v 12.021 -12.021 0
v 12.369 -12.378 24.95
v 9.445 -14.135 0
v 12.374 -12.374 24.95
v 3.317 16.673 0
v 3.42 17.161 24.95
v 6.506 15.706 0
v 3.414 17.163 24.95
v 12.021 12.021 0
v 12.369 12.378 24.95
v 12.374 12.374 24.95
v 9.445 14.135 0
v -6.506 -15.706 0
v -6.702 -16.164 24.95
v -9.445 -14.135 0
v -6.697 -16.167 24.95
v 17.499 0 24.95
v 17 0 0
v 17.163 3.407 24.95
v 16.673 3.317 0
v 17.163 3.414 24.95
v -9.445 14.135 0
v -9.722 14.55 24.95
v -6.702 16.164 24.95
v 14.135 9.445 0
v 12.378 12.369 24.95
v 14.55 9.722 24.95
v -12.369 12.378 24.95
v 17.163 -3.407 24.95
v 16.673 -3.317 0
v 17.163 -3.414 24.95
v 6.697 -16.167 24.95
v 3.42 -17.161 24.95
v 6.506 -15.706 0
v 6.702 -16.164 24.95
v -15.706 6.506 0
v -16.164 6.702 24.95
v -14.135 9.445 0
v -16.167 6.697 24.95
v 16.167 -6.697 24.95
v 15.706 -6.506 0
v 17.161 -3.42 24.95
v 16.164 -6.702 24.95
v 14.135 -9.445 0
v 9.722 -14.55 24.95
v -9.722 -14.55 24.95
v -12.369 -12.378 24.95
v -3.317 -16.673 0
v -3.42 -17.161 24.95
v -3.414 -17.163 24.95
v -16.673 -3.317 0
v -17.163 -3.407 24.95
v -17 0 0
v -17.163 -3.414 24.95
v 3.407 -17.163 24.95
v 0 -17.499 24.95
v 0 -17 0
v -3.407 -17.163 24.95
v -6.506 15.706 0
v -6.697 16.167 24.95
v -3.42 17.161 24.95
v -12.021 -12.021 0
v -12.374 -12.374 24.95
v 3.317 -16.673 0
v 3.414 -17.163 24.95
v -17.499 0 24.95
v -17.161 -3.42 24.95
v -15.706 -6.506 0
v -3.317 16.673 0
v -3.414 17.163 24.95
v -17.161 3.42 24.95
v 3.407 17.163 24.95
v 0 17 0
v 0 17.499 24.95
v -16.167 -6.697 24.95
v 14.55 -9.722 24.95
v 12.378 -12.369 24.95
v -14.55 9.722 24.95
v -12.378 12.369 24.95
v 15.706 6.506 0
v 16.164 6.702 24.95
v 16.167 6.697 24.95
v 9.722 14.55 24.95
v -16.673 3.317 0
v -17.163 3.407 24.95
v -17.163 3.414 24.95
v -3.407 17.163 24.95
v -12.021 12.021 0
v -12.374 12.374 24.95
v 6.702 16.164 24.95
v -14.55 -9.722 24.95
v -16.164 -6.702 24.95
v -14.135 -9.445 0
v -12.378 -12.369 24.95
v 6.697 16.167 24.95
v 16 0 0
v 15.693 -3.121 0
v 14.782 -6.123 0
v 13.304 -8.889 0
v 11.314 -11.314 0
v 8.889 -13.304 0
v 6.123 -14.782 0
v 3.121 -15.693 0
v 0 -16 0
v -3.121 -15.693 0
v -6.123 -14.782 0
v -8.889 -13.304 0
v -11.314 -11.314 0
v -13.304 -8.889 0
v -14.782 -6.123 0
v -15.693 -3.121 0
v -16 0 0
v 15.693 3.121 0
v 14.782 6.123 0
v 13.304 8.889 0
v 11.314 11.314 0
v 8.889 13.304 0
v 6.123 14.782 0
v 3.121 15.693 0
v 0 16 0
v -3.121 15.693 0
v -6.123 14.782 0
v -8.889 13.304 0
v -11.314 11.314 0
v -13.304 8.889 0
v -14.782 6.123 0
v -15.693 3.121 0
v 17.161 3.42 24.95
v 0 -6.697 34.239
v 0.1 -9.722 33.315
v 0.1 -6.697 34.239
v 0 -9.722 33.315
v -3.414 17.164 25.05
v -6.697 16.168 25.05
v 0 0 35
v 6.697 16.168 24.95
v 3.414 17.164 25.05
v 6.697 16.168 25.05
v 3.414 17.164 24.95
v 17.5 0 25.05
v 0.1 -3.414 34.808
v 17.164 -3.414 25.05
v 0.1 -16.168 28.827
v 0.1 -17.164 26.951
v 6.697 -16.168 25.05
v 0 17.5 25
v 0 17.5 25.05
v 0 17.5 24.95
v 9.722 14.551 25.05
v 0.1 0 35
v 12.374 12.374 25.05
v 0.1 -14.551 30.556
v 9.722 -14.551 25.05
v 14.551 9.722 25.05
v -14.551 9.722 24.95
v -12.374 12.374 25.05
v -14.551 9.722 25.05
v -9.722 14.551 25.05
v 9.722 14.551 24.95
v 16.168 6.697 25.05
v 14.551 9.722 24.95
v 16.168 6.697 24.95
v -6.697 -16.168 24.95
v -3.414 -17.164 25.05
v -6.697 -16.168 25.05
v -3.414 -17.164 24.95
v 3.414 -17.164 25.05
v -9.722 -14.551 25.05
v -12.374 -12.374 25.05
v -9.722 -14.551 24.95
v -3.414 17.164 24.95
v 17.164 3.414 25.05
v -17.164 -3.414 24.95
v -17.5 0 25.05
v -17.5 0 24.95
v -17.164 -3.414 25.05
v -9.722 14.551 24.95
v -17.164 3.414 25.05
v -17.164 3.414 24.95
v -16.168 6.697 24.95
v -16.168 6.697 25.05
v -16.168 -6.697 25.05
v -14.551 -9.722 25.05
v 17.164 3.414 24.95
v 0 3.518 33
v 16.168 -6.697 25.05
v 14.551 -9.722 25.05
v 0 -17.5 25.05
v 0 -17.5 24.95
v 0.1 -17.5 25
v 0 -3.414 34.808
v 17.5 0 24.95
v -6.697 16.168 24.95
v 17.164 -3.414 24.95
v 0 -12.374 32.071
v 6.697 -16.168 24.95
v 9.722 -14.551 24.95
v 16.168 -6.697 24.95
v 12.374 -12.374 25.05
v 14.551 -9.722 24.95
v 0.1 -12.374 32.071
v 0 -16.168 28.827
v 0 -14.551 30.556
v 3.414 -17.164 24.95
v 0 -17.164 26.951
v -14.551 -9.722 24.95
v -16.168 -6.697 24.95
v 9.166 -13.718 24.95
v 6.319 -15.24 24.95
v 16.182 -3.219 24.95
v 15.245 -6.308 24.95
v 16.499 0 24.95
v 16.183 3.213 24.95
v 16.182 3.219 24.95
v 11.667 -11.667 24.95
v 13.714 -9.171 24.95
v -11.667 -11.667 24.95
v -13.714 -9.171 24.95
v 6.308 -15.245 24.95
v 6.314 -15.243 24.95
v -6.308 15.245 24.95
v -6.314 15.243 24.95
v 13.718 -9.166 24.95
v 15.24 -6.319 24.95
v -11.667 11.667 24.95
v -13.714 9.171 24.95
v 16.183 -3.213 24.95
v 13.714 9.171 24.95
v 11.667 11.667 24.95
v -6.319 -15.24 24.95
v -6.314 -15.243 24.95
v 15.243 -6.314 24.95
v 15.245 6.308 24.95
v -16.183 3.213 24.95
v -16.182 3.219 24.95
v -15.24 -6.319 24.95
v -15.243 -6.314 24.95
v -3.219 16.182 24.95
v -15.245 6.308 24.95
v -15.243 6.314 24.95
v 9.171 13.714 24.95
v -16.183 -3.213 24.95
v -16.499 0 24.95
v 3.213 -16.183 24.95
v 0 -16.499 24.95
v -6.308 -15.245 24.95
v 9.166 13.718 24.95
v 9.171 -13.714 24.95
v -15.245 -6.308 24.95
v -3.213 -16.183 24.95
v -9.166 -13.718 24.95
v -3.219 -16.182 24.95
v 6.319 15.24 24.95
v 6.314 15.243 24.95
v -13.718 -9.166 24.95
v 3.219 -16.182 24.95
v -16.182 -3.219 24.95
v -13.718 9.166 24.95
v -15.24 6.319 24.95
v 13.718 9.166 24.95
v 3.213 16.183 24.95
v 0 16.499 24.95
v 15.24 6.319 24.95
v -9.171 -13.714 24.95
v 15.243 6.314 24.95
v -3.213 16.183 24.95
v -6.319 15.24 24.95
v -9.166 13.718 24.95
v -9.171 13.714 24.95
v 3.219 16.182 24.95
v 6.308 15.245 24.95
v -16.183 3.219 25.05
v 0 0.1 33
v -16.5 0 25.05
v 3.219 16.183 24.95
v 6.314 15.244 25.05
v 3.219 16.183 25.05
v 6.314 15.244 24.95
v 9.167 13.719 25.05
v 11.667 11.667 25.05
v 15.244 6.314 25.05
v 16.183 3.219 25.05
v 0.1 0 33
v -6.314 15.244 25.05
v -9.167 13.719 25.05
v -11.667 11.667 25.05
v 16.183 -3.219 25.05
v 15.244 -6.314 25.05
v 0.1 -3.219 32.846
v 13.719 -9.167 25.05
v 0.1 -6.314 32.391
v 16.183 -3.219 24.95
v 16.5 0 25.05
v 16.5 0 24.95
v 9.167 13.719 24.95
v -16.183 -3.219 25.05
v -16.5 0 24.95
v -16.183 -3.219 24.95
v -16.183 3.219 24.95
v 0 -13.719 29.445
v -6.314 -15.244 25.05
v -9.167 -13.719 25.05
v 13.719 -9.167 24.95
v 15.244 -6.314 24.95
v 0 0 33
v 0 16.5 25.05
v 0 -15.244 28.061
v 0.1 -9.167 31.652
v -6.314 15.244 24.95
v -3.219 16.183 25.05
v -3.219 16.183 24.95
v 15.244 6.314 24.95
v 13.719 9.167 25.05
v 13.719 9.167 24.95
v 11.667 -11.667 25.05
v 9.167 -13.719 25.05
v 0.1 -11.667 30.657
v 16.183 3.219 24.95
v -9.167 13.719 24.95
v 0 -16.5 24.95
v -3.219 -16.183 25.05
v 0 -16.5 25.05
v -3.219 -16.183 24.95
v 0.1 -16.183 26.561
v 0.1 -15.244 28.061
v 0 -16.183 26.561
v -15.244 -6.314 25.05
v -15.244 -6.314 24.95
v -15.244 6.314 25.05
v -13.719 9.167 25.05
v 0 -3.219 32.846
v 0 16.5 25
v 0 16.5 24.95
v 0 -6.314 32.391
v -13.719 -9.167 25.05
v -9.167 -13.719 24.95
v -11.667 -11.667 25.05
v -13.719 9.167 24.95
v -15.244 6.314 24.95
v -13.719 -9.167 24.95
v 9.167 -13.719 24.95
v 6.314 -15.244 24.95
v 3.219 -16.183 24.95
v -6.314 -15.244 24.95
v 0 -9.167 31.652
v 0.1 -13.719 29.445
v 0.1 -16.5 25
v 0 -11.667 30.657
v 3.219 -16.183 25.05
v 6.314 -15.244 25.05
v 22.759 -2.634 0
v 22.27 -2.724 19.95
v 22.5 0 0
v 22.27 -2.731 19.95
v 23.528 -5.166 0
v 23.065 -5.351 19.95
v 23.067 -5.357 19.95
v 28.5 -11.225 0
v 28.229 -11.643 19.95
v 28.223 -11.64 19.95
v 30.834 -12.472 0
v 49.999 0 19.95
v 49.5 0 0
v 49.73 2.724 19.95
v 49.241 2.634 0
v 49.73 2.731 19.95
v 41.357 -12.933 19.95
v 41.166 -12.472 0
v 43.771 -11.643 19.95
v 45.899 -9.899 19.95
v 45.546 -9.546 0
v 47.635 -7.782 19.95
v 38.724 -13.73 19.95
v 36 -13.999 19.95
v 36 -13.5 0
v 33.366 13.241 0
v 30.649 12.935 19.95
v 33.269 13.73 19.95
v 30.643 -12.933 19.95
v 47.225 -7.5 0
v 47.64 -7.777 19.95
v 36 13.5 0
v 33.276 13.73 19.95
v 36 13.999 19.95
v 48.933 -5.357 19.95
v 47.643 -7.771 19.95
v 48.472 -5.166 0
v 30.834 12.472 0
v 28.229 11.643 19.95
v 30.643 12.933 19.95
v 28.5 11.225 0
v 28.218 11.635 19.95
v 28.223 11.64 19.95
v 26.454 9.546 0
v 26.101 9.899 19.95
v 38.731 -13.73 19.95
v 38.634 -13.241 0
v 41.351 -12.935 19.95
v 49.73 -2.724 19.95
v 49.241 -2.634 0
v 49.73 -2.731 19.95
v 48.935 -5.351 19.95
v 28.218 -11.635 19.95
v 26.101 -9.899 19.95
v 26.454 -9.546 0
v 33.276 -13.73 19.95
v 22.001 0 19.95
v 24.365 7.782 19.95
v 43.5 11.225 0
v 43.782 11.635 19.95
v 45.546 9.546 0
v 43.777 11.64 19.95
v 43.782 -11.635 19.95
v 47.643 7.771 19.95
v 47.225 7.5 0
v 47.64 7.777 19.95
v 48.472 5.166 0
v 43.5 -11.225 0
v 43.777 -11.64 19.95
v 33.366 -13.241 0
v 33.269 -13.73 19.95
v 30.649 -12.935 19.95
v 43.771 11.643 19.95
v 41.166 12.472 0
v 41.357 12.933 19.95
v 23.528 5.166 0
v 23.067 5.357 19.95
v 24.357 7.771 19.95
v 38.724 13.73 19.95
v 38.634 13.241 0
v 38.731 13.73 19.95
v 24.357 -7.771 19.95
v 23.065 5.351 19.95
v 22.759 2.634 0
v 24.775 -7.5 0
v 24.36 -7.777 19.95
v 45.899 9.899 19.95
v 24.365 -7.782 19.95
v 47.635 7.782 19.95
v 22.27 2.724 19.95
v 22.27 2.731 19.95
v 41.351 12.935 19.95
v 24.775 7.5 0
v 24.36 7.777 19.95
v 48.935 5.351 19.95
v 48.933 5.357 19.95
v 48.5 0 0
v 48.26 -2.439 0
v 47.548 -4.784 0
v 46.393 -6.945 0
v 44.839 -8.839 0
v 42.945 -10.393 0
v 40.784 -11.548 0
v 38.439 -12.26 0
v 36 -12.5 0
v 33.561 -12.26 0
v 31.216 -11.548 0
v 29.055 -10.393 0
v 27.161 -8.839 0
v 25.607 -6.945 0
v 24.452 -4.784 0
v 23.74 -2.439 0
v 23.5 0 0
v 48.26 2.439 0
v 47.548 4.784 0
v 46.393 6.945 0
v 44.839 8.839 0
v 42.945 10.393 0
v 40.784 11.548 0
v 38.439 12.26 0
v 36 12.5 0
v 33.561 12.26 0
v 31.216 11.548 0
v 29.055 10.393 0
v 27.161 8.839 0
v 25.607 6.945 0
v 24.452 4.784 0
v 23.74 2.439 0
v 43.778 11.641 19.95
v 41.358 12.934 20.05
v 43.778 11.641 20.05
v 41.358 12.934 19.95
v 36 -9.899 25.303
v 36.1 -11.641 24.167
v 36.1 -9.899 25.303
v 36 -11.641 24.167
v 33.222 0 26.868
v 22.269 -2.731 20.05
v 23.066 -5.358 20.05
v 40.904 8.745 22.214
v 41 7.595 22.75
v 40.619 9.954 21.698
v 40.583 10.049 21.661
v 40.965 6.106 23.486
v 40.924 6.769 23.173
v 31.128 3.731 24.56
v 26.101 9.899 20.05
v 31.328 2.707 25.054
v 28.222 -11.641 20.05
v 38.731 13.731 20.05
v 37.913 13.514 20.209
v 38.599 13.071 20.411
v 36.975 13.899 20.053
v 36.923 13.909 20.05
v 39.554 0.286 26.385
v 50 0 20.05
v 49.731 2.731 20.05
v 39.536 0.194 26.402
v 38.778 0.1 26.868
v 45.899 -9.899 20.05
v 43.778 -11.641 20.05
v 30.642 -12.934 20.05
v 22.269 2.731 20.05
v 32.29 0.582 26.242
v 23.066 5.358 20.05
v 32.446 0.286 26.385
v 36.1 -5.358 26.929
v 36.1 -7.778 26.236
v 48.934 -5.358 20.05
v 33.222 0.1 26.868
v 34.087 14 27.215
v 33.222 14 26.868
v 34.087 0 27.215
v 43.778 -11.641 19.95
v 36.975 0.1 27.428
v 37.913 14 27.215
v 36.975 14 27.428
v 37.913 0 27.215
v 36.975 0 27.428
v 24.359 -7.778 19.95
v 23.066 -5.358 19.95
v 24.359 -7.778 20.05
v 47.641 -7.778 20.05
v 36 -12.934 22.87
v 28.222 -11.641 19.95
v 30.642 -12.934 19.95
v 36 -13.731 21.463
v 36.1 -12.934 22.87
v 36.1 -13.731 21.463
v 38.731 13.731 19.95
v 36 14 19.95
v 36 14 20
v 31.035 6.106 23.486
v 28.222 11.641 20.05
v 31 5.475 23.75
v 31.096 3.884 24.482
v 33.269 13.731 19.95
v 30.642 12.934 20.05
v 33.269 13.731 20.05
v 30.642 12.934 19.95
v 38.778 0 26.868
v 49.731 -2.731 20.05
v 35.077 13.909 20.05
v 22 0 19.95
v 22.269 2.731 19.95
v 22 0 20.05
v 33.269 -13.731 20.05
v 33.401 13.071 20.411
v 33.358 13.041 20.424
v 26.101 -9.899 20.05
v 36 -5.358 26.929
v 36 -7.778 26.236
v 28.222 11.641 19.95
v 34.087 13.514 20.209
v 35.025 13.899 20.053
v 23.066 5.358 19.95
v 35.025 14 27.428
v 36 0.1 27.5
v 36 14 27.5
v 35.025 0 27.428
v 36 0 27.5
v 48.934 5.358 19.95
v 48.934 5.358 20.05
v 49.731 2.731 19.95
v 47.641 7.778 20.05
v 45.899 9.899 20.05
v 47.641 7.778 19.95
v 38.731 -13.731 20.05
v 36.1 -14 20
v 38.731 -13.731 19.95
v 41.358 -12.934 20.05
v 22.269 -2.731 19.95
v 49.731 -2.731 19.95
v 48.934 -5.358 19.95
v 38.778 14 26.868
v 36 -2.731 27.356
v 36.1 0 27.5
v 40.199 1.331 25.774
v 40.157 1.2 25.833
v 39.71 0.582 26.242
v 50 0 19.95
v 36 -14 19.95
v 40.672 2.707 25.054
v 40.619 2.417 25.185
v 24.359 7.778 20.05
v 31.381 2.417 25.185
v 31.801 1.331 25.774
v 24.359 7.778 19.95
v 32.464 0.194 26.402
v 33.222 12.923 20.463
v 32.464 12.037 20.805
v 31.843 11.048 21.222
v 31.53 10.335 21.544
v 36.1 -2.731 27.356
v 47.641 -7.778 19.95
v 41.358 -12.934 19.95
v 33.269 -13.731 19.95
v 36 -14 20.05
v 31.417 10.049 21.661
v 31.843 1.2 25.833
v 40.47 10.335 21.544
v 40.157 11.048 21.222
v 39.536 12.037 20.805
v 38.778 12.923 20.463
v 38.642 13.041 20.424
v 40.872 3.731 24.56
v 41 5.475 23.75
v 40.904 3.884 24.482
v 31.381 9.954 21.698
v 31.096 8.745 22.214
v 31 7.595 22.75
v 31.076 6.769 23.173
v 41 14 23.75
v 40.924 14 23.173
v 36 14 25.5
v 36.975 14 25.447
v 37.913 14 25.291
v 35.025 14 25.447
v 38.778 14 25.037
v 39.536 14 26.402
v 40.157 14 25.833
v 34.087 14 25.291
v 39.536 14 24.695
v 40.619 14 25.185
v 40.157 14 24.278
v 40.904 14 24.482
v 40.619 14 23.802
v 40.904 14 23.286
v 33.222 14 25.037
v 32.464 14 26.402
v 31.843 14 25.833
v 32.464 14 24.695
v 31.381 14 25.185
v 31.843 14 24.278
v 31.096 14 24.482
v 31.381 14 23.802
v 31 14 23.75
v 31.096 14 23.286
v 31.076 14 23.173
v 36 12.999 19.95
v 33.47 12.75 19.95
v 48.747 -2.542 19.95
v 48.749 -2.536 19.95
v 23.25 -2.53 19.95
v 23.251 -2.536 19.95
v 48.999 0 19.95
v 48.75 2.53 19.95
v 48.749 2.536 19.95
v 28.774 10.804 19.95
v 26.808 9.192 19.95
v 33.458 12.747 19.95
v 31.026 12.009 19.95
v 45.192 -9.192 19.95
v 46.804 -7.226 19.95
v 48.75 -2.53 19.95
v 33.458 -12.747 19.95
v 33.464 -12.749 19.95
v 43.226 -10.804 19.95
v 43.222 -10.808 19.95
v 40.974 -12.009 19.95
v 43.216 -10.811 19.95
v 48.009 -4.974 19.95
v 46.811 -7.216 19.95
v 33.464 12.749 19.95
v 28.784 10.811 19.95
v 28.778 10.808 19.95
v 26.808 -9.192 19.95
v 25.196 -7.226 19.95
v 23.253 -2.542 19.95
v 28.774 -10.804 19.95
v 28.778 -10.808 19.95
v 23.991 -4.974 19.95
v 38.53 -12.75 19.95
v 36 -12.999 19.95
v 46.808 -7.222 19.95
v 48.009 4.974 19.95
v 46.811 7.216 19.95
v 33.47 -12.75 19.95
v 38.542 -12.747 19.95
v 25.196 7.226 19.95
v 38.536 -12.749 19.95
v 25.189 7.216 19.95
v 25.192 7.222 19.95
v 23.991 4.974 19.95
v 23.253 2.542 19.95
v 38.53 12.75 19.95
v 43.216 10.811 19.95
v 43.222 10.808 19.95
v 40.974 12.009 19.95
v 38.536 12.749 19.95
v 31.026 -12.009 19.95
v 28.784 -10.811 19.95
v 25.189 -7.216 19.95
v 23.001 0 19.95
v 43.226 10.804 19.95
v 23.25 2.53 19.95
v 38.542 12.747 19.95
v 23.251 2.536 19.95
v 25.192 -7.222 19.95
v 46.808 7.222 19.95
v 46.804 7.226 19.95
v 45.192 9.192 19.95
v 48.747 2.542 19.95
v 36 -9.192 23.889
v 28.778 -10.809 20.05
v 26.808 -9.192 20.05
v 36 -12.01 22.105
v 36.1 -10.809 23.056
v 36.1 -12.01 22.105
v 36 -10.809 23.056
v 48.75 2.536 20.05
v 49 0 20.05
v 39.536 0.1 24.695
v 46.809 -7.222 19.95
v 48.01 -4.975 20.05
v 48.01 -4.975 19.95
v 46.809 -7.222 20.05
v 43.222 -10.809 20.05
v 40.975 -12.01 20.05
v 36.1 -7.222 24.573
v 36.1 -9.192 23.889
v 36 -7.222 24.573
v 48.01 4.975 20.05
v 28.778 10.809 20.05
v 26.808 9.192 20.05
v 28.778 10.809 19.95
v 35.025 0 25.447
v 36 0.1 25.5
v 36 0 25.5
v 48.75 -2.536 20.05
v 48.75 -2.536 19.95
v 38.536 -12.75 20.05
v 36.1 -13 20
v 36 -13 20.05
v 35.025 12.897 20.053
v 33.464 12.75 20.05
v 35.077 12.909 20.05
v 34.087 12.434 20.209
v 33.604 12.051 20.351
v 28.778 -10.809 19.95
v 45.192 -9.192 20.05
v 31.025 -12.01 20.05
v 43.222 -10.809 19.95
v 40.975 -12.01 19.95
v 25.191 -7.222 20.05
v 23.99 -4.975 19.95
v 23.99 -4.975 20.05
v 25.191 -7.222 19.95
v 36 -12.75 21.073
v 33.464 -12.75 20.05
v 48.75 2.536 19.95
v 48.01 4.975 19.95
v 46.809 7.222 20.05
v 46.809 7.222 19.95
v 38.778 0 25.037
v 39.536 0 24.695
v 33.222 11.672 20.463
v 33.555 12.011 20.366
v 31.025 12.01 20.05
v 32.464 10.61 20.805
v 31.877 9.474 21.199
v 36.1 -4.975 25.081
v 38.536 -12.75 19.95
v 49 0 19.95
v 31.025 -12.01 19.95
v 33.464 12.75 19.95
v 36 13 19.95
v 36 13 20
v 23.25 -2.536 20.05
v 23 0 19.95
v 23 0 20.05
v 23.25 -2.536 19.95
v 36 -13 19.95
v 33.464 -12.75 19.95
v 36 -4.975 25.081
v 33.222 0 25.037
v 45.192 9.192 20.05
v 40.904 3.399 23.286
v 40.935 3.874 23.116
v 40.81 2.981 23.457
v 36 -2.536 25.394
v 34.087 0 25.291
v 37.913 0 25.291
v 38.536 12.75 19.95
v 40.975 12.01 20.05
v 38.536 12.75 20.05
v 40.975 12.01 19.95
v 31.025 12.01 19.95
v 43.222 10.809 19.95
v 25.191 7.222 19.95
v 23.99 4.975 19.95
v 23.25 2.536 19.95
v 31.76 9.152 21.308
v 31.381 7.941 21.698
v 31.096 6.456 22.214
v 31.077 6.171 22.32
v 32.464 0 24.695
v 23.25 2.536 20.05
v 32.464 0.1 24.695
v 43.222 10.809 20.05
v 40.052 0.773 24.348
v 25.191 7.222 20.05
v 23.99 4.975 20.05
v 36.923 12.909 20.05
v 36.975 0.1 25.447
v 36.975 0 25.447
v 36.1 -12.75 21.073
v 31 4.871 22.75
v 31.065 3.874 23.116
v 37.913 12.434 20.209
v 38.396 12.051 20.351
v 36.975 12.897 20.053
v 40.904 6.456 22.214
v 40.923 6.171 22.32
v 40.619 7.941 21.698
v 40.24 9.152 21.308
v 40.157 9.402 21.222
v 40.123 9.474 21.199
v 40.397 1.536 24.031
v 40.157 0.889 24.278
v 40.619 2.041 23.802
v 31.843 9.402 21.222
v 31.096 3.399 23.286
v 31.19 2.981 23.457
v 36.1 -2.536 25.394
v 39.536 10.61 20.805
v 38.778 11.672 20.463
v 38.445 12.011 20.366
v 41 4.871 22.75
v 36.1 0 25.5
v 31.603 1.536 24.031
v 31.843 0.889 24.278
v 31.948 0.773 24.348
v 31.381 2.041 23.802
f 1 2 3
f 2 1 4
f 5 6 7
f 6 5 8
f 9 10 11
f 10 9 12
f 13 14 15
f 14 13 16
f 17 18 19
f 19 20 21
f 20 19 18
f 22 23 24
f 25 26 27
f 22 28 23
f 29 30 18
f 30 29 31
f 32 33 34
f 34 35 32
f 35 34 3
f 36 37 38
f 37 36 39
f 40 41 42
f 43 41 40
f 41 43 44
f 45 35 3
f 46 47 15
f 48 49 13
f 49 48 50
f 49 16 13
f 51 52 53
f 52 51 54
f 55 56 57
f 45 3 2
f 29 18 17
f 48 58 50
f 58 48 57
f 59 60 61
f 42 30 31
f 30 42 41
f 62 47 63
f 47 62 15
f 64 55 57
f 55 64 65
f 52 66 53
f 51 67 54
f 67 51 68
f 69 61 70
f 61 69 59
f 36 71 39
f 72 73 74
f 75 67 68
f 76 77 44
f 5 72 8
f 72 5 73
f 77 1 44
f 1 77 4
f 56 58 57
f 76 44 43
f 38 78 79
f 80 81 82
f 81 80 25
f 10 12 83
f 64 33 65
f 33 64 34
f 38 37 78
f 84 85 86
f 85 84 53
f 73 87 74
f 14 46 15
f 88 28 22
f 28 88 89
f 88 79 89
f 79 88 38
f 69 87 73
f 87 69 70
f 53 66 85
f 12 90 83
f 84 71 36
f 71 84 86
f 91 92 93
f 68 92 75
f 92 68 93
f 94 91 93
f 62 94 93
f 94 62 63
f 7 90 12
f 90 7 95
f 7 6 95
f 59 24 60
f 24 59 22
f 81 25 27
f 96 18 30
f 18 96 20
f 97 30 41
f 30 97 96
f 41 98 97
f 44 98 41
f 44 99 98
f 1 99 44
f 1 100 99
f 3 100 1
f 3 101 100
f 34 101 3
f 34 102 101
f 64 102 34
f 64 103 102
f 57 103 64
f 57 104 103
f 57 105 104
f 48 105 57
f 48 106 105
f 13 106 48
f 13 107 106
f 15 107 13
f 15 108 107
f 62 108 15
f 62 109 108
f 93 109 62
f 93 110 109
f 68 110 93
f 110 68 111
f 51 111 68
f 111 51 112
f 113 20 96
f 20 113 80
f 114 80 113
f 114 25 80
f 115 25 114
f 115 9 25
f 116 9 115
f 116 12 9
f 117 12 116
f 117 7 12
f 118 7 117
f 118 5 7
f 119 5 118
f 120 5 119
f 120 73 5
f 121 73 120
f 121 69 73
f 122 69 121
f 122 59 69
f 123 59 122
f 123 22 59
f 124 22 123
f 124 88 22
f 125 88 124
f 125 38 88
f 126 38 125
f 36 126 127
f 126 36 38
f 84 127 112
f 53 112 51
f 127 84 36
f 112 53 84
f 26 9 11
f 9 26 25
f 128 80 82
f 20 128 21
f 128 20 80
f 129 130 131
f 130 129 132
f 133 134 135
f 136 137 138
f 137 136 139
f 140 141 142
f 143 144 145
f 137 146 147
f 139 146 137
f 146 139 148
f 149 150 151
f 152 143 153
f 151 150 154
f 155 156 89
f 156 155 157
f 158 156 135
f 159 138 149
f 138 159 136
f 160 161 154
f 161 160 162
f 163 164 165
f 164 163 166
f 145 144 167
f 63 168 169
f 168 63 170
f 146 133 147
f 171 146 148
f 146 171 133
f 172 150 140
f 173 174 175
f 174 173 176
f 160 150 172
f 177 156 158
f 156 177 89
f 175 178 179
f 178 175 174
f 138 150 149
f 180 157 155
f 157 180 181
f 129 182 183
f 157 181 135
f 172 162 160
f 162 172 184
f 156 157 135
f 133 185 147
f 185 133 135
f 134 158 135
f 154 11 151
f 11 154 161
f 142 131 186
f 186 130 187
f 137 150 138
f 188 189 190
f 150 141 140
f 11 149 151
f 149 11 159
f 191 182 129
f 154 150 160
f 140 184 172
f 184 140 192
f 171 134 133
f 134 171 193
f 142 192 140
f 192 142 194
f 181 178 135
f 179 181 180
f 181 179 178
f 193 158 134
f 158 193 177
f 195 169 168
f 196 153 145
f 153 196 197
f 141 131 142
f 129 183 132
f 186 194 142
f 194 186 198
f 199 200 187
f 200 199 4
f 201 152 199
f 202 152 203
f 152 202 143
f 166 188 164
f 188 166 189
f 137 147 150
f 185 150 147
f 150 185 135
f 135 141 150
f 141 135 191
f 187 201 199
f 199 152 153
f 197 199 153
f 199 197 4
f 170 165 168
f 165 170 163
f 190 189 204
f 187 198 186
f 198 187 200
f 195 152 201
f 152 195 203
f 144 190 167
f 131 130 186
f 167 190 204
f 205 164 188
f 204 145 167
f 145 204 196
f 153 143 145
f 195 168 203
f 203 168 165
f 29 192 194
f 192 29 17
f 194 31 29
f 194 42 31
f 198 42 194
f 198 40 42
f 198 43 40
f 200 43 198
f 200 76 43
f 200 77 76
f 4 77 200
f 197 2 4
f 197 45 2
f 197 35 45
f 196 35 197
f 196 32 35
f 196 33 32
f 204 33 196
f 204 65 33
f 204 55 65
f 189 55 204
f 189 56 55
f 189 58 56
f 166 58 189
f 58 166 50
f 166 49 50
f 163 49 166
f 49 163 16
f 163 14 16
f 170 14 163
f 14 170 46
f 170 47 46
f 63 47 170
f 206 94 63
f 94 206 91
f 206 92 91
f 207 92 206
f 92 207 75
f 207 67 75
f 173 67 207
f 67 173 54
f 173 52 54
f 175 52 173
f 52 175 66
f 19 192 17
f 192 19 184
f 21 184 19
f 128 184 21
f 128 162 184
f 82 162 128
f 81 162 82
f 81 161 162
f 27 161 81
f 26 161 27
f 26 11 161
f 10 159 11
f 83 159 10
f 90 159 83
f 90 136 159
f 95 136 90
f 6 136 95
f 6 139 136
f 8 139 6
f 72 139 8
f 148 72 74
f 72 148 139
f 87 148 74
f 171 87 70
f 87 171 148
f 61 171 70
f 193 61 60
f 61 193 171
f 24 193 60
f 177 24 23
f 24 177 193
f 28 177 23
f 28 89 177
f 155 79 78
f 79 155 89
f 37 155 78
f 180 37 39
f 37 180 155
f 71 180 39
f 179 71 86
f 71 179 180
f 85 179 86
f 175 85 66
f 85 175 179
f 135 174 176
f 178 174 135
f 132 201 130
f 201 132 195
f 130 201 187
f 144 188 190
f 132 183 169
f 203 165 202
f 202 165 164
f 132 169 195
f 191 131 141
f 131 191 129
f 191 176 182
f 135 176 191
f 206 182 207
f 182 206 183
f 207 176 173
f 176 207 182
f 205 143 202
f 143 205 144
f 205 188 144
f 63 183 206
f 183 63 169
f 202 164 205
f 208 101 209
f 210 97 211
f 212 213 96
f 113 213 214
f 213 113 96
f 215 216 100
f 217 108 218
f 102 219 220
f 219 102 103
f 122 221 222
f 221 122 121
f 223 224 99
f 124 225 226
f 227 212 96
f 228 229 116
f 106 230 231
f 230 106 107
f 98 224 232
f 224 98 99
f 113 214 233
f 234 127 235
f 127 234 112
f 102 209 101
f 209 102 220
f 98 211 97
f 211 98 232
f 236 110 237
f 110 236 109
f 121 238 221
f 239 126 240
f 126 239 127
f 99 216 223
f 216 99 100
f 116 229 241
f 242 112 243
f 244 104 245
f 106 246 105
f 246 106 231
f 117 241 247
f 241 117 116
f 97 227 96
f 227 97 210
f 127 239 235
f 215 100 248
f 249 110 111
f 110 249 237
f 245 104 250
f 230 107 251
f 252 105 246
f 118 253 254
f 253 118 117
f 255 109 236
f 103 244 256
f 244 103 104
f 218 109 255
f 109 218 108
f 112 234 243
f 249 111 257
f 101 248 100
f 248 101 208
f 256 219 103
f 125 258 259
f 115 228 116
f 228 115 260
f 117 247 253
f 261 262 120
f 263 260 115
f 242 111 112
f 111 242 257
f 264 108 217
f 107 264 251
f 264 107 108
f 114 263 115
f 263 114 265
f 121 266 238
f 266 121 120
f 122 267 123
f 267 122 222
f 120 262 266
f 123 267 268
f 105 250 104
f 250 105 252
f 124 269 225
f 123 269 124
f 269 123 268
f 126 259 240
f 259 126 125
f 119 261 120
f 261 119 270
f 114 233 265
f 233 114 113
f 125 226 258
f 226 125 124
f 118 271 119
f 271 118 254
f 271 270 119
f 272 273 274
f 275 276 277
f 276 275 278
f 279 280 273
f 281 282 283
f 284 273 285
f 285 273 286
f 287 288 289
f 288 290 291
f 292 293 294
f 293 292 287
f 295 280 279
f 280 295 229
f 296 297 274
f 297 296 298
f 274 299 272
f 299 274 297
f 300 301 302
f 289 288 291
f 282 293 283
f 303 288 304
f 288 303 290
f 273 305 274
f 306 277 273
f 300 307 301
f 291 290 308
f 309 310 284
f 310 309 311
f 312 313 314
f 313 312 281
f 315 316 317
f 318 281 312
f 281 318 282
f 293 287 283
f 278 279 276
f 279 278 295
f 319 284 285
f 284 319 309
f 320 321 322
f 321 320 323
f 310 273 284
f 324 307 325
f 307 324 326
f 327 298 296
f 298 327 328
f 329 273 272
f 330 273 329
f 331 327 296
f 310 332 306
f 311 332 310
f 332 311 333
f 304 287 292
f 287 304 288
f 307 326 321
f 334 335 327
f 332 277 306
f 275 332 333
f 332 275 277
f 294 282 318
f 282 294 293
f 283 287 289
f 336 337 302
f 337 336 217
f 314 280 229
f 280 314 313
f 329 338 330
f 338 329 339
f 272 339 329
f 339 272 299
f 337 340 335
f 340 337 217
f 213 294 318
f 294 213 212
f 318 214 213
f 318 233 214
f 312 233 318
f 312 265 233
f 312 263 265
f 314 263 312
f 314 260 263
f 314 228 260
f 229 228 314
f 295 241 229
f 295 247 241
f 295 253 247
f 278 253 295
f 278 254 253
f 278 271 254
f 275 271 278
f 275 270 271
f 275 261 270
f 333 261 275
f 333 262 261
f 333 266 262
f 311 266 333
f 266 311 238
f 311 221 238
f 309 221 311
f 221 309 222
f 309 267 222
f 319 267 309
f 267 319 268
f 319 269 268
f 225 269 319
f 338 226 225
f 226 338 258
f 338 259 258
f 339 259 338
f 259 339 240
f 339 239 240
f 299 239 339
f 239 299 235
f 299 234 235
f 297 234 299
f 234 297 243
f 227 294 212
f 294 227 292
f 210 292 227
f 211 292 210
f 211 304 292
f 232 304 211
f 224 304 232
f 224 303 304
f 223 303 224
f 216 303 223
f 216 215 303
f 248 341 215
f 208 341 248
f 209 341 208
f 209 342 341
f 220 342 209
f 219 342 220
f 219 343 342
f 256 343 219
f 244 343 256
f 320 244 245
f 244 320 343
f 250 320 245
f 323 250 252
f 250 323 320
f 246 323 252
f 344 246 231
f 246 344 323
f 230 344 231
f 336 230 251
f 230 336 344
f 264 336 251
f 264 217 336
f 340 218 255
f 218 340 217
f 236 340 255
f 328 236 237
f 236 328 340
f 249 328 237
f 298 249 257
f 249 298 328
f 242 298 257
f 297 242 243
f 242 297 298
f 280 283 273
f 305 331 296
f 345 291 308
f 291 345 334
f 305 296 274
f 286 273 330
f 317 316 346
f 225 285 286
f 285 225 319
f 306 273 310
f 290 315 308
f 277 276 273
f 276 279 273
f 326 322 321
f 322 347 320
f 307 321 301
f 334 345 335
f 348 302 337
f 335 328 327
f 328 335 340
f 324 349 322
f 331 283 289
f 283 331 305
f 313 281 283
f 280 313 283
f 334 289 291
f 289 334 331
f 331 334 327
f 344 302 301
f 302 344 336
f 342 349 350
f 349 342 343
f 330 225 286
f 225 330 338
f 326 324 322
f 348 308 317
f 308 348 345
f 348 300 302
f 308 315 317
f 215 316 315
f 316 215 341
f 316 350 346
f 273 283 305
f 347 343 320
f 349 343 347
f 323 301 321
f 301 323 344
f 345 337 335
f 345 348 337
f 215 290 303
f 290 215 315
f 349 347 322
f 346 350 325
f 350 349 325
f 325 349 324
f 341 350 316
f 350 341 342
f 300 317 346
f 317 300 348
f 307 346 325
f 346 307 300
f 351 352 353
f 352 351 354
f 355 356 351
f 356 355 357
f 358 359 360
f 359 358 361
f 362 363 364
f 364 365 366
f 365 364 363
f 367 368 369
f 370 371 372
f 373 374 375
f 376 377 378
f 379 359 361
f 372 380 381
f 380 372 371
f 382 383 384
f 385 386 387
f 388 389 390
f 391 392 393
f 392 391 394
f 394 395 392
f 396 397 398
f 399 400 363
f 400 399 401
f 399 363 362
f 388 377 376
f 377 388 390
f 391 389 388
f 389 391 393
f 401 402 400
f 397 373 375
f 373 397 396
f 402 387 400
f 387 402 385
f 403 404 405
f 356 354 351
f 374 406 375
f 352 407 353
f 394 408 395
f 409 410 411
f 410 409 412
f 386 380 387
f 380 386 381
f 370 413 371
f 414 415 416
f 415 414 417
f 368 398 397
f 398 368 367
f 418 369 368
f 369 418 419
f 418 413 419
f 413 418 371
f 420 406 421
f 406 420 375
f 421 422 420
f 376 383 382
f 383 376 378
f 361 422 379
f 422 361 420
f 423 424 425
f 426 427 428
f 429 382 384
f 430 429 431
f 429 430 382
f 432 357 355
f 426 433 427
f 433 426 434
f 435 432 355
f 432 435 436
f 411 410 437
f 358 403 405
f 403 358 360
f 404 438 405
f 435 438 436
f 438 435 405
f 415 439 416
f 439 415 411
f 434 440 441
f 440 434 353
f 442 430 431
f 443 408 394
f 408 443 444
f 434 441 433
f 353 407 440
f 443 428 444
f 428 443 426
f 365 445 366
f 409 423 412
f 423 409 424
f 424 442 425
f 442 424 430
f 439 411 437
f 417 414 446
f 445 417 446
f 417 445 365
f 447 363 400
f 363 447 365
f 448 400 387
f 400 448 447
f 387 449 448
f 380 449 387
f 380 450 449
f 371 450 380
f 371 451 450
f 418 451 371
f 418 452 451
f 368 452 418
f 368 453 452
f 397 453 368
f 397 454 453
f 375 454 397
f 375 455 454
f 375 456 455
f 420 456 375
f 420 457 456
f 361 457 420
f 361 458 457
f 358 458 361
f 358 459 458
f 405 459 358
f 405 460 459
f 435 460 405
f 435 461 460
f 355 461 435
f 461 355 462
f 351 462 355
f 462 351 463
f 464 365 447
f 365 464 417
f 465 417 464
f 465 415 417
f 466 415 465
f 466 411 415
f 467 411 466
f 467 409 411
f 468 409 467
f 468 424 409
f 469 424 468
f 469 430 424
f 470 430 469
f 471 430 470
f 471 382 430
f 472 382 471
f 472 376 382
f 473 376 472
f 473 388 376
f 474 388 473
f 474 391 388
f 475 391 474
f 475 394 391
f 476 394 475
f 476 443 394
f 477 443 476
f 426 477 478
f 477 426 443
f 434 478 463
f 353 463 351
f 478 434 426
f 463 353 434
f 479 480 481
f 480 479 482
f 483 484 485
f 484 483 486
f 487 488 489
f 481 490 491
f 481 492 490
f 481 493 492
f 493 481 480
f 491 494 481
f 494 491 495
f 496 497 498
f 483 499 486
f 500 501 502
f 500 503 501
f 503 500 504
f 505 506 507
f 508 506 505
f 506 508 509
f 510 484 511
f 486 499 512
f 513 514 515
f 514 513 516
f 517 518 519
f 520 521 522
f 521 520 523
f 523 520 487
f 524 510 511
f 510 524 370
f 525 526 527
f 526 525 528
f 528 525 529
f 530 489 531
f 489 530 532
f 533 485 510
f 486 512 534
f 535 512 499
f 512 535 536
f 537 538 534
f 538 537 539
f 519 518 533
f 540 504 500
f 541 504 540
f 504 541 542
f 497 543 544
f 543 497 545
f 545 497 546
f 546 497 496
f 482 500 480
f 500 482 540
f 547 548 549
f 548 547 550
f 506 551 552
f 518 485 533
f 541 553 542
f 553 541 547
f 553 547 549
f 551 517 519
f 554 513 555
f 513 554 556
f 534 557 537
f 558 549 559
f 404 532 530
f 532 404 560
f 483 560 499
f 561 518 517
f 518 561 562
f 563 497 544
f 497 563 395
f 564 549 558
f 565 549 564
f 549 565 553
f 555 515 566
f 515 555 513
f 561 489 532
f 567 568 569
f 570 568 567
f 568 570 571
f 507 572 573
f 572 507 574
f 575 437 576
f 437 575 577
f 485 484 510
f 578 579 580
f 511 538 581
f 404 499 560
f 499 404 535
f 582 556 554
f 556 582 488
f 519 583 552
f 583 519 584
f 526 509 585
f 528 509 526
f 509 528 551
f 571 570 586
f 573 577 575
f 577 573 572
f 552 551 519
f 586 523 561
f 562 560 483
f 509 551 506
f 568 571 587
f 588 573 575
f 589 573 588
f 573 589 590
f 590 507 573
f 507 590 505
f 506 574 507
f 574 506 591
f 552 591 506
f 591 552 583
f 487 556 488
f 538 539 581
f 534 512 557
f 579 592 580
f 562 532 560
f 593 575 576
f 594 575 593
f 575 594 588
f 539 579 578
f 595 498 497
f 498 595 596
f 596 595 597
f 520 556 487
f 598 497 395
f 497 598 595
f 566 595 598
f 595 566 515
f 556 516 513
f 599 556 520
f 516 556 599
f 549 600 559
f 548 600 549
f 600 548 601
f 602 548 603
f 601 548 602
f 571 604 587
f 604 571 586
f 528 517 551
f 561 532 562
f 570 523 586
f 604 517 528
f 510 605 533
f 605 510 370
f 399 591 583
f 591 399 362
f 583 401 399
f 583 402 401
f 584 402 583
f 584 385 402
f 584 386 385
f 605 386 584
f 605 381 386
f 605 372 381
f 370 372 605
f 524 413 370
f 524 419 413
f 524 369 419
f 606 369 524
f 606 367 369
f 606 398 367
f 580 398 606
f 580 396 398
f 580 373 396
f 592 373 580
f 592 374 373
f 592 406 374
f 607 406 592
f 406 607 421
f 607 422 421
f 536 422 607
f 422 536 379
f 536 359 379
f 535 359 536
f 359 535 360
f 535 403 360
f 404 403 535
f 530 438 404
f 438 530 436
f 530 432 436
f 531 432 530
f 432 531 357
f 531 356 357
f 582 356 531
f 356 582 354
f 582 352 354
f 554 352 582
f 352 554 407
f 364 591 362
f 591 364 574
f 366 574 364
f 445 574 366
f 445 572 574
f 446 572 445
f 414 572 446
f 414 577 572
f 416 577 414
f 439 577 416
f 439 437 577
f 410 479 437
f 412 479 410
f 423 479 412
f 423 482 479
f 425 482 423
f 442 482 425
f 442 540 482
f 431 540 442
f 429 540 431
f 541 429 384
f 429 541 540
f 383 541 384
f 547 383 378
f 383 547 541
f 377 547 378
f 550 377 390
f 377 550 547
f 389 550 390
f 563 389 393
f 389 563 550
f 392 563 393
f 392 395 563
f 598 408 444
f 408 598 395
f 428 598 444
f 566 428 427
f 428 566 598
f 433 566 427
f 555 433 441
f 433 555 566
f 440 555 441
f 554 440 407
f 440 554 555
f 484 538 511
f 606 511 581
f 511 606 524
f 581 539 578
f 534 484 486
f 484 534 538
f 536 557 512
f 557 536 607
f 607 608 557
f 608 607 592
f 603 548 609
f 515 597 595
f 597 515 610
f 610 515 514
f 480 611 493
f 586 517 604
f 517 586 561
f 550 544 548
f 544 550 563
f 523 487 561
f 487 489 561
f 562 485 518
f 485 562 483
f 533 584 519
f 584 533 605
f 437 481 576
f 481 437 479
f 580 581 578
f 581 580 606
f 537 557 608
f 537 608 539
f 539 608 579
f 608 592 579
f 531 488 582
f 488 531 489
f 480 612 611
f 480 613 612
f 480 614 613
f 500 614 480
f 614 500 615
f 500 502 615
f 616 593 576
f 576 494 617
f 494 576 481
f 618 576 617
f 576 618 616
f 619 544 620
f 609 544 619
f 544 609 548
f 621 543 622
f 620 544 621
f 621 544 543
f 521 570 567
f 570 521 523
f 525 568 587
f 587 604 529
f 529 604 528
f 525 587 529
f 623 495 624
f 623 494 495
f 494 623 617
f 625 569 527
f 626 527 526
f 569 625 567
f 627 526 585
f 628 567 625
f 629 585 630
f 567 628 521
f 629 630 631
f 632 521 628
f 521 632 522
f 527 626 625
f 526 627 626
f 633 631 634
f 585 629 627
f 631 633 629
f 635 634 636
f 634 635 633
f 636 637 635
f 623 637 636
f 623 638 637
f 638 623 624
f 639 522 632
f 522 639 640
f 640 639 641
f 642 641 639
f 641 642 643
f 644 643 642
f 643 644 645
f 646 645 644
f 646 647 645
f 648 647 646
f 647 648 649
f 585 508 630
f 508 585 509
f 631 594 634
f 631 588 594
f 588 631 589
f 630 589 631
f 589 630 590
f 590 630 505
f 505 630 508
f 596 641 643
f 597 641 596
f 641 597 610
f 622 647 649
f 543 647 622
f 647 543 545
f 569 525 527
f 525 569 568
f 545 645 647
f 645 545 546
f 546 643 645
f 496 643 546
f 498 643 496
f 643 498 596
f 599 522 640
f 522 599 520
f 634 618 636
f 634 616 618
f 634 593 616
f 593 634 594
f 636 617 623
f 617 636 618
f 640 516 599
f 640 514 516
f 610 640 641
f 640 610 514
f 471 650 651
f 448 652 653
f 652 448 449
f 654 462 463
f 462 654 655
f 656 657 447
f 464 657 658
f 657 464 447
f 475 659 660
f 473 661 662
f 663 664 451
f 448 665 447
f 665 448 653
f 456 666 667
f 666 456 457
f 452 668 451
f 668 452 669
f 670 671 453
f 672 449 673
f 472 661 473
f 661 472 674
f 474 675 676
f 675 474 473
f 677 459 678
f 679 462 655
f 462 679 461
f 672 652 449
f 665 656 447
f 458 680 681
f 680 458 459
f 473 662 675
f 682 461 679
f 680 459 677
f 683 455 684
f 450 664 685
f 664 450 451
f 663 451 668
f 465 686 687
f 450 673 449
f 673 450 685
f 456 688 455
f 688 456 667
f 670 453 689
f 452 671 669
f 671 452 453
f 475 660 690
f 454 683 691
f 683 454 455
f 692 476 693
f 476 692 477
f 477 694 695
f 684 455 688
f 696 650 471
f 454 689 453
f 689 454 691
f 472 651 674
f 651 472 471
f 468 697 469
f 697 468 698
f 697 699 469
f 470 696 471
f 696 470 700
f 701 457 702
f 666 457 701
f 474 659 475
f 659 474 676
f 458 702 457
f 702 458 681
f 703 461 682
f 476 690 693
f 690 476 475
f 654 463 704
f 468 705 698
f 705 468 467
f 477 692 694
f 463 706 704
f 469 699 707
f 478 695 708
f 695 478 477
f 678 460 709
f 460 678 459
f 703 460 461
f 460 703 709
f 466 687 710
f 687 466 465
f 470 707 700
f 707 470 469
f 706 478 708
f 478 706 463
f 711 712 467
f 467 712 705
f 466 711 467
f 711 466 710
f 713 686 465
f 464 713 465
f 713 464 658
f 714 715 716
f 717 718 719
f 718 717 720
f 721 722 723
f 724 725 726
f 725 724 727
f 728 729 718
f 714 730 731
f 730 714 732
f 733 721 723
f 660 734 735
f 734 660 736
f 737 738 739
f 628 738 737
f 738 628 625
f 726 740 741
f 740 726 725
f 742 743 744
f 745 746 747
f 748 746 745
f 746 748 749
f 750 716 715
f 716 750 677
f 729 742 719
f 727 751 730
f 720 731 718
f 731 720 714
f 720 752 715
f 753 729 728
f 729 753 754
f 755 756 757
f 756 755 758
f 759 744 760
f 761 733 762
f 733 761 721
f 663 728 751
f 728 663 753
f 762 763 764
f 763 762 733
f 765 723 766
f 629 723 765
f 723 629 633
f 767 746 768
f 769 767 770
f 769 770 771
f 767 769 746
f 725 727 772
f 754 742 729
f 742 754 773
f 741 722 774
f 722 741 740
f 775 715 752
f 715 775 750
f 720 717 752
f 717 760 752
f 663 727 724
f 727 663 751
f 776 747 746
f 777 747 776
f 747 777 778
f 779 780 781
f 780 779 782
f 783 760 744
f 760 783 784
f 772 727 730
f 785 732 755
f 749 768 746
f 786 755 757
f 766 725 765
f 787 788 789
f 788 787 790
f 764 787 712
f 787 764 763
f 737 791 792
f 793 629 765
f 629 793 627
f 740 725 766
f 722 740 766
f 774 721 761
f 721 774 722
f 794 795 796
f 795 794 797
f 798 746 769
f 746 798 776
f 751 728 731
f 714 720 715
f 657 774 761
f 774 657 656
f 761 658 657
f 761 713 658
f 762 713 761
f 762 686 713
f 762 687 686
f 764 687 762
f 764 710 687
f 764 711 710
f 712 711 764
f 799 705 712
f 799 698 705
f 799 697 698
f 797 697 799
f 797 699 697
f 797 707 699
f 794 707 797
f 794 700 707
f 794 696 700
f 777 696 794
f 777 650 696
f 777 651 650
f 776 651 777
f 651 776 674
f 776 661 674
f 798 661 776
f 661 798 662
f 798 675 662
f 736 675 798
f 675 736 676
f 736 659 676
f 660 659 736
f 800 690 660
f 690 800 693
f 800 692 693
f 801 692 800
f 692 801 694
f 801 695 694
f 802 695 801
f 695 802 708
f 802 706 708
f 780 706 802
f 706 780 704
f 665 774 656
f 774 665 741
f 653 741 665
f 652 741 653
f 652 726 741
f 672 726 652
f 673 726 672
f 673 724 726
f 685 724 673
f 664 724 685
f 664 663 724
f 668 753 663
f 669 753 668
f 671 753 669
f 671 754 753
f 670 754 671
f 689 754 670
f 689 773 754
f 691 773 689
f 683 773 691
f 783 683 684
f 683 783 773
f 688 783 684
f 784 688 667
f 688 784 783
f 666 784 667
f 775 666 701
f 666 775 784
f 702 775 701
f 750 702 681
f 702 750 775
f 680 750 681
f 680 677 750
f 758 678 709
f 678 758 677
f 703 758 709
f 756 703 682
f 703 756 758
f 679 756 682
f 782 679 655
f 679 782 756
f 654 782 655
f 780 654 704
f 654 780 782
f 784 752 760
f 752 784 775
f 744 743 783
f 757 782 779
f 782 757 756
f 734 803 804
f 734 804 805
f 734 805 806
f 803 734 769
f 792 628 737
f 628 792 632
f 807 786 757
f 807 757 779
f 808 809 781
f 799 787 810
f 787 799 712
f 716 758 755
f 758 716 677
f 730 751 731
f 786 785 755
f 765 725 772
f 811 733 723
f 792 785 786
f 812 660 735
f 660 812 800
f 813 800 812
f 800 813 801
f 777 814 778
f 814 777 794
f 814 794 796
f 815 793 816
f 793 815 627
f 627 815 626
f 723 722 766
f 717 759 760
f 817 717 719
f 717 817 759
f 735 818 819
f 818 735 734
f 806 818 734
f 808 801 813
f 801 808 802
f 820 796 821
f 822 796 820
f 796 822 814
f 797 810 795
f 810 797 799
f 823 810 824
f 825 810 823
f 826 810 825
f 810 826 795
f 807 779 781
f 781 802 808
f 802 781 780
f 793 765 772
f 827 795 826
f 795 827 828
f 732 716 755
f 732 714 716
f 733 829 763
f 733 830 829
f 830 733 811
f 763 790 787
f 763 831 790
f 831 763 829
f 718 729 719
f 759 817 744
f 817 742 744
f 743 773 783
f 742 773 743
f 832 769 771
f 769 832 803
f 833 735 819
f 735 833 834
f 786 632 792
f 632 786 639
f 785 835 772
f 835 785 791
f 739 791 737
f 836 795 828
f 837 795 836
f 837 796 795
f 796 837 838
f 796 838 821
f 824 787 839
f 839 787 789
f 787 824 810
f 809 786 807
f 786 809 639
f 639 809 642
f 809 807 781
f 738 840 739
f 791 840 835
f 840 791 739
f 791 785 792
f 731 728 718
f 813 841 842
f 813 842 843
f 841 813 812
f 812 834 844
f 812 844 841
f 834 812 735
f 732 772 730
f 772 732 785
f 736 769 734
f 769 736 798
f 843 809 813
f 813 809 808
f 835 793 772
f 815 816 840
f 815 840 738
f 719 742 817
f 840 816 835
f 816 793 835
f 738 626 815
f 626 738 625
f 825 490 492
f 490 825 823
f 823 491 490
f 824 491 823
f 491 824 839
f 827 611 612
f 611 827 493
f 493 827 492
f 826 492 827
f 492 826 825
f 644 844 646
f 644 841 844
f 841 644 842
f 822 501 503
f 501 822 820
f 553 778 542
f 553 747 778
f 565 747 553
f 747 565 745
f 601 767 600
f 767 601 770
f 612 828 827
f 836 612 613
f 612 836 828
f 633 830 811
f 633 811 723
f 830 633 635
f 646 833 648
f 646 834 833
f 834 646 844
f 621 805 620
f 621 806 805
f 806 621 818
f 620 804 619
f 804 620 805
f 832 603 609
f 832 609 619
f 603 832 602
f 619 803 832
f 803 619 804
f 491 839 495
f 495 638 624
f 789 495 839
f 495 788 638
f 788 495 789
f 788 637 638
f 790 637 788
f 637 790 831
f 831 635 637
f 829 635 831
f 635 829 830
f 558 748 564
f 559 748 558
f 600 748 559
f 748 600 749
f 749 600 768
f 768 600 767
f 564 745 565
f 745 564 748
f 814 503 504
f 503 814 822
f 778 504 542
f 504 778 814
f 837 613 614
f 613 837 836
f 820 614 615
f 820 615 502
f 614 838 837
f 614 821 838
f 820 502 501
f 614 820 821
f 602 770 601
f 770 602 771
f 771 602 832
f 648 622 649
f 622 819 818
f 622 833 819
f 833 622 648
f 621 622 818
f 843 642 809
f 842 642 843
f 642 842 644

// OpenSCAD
$fn= 32;

module adapter( outer_d, spigot_l, slot_w, slot_h, slot_l=0, extralength = 0 )
{
    translate([0,0,-extralength/2])
        cylinder(d1=outer_d-1, d2=outer_d, h=spigot_l+0.5*extralength);
    translate([0,0,spigot_l])
    hull(){
        cylinder(d=outer_d, h=0.1, center=true);
        intersection() {
            cylinder(d1=outer_d, d2=slot_h, h=slot_w/2);
            translate([0,slot_h/2])
                cube(slot_h, center=true);
        }
        intersection(){
            scale([1,outer_d,2*(slot_w)])
            rotate([0,90,0])
                cylinder(d=1, h=0.1);
            translate([0,-outer_d,0])
                cube(outer_d);
        }
        translate([0,extralength/2,slot_w/2+extralength])
        scale([slot_h, 0.1, slot_w])
            rotate([-90,0,0])
                cylinder(d=1, h=1);
    }
    
    translate([0,0,spigot_l+extralength])
        translate([0,extralength/2, slot_w/2])
            scale([slot_h, outer_d/2 + extralength+slot_l, slot_w])
            rotate([-90,0,0])
                cylinder(d=1, h=1);
     
}

difference() {
    adapter(35, 25, 10 );
    adapter(33, 25, 8, 0, 1);
}
translate([36,0,0])


difference() {
    adapter(28, 20, 7.5,10);
    adapter(26, 20, 5.5,10, 1);
}
